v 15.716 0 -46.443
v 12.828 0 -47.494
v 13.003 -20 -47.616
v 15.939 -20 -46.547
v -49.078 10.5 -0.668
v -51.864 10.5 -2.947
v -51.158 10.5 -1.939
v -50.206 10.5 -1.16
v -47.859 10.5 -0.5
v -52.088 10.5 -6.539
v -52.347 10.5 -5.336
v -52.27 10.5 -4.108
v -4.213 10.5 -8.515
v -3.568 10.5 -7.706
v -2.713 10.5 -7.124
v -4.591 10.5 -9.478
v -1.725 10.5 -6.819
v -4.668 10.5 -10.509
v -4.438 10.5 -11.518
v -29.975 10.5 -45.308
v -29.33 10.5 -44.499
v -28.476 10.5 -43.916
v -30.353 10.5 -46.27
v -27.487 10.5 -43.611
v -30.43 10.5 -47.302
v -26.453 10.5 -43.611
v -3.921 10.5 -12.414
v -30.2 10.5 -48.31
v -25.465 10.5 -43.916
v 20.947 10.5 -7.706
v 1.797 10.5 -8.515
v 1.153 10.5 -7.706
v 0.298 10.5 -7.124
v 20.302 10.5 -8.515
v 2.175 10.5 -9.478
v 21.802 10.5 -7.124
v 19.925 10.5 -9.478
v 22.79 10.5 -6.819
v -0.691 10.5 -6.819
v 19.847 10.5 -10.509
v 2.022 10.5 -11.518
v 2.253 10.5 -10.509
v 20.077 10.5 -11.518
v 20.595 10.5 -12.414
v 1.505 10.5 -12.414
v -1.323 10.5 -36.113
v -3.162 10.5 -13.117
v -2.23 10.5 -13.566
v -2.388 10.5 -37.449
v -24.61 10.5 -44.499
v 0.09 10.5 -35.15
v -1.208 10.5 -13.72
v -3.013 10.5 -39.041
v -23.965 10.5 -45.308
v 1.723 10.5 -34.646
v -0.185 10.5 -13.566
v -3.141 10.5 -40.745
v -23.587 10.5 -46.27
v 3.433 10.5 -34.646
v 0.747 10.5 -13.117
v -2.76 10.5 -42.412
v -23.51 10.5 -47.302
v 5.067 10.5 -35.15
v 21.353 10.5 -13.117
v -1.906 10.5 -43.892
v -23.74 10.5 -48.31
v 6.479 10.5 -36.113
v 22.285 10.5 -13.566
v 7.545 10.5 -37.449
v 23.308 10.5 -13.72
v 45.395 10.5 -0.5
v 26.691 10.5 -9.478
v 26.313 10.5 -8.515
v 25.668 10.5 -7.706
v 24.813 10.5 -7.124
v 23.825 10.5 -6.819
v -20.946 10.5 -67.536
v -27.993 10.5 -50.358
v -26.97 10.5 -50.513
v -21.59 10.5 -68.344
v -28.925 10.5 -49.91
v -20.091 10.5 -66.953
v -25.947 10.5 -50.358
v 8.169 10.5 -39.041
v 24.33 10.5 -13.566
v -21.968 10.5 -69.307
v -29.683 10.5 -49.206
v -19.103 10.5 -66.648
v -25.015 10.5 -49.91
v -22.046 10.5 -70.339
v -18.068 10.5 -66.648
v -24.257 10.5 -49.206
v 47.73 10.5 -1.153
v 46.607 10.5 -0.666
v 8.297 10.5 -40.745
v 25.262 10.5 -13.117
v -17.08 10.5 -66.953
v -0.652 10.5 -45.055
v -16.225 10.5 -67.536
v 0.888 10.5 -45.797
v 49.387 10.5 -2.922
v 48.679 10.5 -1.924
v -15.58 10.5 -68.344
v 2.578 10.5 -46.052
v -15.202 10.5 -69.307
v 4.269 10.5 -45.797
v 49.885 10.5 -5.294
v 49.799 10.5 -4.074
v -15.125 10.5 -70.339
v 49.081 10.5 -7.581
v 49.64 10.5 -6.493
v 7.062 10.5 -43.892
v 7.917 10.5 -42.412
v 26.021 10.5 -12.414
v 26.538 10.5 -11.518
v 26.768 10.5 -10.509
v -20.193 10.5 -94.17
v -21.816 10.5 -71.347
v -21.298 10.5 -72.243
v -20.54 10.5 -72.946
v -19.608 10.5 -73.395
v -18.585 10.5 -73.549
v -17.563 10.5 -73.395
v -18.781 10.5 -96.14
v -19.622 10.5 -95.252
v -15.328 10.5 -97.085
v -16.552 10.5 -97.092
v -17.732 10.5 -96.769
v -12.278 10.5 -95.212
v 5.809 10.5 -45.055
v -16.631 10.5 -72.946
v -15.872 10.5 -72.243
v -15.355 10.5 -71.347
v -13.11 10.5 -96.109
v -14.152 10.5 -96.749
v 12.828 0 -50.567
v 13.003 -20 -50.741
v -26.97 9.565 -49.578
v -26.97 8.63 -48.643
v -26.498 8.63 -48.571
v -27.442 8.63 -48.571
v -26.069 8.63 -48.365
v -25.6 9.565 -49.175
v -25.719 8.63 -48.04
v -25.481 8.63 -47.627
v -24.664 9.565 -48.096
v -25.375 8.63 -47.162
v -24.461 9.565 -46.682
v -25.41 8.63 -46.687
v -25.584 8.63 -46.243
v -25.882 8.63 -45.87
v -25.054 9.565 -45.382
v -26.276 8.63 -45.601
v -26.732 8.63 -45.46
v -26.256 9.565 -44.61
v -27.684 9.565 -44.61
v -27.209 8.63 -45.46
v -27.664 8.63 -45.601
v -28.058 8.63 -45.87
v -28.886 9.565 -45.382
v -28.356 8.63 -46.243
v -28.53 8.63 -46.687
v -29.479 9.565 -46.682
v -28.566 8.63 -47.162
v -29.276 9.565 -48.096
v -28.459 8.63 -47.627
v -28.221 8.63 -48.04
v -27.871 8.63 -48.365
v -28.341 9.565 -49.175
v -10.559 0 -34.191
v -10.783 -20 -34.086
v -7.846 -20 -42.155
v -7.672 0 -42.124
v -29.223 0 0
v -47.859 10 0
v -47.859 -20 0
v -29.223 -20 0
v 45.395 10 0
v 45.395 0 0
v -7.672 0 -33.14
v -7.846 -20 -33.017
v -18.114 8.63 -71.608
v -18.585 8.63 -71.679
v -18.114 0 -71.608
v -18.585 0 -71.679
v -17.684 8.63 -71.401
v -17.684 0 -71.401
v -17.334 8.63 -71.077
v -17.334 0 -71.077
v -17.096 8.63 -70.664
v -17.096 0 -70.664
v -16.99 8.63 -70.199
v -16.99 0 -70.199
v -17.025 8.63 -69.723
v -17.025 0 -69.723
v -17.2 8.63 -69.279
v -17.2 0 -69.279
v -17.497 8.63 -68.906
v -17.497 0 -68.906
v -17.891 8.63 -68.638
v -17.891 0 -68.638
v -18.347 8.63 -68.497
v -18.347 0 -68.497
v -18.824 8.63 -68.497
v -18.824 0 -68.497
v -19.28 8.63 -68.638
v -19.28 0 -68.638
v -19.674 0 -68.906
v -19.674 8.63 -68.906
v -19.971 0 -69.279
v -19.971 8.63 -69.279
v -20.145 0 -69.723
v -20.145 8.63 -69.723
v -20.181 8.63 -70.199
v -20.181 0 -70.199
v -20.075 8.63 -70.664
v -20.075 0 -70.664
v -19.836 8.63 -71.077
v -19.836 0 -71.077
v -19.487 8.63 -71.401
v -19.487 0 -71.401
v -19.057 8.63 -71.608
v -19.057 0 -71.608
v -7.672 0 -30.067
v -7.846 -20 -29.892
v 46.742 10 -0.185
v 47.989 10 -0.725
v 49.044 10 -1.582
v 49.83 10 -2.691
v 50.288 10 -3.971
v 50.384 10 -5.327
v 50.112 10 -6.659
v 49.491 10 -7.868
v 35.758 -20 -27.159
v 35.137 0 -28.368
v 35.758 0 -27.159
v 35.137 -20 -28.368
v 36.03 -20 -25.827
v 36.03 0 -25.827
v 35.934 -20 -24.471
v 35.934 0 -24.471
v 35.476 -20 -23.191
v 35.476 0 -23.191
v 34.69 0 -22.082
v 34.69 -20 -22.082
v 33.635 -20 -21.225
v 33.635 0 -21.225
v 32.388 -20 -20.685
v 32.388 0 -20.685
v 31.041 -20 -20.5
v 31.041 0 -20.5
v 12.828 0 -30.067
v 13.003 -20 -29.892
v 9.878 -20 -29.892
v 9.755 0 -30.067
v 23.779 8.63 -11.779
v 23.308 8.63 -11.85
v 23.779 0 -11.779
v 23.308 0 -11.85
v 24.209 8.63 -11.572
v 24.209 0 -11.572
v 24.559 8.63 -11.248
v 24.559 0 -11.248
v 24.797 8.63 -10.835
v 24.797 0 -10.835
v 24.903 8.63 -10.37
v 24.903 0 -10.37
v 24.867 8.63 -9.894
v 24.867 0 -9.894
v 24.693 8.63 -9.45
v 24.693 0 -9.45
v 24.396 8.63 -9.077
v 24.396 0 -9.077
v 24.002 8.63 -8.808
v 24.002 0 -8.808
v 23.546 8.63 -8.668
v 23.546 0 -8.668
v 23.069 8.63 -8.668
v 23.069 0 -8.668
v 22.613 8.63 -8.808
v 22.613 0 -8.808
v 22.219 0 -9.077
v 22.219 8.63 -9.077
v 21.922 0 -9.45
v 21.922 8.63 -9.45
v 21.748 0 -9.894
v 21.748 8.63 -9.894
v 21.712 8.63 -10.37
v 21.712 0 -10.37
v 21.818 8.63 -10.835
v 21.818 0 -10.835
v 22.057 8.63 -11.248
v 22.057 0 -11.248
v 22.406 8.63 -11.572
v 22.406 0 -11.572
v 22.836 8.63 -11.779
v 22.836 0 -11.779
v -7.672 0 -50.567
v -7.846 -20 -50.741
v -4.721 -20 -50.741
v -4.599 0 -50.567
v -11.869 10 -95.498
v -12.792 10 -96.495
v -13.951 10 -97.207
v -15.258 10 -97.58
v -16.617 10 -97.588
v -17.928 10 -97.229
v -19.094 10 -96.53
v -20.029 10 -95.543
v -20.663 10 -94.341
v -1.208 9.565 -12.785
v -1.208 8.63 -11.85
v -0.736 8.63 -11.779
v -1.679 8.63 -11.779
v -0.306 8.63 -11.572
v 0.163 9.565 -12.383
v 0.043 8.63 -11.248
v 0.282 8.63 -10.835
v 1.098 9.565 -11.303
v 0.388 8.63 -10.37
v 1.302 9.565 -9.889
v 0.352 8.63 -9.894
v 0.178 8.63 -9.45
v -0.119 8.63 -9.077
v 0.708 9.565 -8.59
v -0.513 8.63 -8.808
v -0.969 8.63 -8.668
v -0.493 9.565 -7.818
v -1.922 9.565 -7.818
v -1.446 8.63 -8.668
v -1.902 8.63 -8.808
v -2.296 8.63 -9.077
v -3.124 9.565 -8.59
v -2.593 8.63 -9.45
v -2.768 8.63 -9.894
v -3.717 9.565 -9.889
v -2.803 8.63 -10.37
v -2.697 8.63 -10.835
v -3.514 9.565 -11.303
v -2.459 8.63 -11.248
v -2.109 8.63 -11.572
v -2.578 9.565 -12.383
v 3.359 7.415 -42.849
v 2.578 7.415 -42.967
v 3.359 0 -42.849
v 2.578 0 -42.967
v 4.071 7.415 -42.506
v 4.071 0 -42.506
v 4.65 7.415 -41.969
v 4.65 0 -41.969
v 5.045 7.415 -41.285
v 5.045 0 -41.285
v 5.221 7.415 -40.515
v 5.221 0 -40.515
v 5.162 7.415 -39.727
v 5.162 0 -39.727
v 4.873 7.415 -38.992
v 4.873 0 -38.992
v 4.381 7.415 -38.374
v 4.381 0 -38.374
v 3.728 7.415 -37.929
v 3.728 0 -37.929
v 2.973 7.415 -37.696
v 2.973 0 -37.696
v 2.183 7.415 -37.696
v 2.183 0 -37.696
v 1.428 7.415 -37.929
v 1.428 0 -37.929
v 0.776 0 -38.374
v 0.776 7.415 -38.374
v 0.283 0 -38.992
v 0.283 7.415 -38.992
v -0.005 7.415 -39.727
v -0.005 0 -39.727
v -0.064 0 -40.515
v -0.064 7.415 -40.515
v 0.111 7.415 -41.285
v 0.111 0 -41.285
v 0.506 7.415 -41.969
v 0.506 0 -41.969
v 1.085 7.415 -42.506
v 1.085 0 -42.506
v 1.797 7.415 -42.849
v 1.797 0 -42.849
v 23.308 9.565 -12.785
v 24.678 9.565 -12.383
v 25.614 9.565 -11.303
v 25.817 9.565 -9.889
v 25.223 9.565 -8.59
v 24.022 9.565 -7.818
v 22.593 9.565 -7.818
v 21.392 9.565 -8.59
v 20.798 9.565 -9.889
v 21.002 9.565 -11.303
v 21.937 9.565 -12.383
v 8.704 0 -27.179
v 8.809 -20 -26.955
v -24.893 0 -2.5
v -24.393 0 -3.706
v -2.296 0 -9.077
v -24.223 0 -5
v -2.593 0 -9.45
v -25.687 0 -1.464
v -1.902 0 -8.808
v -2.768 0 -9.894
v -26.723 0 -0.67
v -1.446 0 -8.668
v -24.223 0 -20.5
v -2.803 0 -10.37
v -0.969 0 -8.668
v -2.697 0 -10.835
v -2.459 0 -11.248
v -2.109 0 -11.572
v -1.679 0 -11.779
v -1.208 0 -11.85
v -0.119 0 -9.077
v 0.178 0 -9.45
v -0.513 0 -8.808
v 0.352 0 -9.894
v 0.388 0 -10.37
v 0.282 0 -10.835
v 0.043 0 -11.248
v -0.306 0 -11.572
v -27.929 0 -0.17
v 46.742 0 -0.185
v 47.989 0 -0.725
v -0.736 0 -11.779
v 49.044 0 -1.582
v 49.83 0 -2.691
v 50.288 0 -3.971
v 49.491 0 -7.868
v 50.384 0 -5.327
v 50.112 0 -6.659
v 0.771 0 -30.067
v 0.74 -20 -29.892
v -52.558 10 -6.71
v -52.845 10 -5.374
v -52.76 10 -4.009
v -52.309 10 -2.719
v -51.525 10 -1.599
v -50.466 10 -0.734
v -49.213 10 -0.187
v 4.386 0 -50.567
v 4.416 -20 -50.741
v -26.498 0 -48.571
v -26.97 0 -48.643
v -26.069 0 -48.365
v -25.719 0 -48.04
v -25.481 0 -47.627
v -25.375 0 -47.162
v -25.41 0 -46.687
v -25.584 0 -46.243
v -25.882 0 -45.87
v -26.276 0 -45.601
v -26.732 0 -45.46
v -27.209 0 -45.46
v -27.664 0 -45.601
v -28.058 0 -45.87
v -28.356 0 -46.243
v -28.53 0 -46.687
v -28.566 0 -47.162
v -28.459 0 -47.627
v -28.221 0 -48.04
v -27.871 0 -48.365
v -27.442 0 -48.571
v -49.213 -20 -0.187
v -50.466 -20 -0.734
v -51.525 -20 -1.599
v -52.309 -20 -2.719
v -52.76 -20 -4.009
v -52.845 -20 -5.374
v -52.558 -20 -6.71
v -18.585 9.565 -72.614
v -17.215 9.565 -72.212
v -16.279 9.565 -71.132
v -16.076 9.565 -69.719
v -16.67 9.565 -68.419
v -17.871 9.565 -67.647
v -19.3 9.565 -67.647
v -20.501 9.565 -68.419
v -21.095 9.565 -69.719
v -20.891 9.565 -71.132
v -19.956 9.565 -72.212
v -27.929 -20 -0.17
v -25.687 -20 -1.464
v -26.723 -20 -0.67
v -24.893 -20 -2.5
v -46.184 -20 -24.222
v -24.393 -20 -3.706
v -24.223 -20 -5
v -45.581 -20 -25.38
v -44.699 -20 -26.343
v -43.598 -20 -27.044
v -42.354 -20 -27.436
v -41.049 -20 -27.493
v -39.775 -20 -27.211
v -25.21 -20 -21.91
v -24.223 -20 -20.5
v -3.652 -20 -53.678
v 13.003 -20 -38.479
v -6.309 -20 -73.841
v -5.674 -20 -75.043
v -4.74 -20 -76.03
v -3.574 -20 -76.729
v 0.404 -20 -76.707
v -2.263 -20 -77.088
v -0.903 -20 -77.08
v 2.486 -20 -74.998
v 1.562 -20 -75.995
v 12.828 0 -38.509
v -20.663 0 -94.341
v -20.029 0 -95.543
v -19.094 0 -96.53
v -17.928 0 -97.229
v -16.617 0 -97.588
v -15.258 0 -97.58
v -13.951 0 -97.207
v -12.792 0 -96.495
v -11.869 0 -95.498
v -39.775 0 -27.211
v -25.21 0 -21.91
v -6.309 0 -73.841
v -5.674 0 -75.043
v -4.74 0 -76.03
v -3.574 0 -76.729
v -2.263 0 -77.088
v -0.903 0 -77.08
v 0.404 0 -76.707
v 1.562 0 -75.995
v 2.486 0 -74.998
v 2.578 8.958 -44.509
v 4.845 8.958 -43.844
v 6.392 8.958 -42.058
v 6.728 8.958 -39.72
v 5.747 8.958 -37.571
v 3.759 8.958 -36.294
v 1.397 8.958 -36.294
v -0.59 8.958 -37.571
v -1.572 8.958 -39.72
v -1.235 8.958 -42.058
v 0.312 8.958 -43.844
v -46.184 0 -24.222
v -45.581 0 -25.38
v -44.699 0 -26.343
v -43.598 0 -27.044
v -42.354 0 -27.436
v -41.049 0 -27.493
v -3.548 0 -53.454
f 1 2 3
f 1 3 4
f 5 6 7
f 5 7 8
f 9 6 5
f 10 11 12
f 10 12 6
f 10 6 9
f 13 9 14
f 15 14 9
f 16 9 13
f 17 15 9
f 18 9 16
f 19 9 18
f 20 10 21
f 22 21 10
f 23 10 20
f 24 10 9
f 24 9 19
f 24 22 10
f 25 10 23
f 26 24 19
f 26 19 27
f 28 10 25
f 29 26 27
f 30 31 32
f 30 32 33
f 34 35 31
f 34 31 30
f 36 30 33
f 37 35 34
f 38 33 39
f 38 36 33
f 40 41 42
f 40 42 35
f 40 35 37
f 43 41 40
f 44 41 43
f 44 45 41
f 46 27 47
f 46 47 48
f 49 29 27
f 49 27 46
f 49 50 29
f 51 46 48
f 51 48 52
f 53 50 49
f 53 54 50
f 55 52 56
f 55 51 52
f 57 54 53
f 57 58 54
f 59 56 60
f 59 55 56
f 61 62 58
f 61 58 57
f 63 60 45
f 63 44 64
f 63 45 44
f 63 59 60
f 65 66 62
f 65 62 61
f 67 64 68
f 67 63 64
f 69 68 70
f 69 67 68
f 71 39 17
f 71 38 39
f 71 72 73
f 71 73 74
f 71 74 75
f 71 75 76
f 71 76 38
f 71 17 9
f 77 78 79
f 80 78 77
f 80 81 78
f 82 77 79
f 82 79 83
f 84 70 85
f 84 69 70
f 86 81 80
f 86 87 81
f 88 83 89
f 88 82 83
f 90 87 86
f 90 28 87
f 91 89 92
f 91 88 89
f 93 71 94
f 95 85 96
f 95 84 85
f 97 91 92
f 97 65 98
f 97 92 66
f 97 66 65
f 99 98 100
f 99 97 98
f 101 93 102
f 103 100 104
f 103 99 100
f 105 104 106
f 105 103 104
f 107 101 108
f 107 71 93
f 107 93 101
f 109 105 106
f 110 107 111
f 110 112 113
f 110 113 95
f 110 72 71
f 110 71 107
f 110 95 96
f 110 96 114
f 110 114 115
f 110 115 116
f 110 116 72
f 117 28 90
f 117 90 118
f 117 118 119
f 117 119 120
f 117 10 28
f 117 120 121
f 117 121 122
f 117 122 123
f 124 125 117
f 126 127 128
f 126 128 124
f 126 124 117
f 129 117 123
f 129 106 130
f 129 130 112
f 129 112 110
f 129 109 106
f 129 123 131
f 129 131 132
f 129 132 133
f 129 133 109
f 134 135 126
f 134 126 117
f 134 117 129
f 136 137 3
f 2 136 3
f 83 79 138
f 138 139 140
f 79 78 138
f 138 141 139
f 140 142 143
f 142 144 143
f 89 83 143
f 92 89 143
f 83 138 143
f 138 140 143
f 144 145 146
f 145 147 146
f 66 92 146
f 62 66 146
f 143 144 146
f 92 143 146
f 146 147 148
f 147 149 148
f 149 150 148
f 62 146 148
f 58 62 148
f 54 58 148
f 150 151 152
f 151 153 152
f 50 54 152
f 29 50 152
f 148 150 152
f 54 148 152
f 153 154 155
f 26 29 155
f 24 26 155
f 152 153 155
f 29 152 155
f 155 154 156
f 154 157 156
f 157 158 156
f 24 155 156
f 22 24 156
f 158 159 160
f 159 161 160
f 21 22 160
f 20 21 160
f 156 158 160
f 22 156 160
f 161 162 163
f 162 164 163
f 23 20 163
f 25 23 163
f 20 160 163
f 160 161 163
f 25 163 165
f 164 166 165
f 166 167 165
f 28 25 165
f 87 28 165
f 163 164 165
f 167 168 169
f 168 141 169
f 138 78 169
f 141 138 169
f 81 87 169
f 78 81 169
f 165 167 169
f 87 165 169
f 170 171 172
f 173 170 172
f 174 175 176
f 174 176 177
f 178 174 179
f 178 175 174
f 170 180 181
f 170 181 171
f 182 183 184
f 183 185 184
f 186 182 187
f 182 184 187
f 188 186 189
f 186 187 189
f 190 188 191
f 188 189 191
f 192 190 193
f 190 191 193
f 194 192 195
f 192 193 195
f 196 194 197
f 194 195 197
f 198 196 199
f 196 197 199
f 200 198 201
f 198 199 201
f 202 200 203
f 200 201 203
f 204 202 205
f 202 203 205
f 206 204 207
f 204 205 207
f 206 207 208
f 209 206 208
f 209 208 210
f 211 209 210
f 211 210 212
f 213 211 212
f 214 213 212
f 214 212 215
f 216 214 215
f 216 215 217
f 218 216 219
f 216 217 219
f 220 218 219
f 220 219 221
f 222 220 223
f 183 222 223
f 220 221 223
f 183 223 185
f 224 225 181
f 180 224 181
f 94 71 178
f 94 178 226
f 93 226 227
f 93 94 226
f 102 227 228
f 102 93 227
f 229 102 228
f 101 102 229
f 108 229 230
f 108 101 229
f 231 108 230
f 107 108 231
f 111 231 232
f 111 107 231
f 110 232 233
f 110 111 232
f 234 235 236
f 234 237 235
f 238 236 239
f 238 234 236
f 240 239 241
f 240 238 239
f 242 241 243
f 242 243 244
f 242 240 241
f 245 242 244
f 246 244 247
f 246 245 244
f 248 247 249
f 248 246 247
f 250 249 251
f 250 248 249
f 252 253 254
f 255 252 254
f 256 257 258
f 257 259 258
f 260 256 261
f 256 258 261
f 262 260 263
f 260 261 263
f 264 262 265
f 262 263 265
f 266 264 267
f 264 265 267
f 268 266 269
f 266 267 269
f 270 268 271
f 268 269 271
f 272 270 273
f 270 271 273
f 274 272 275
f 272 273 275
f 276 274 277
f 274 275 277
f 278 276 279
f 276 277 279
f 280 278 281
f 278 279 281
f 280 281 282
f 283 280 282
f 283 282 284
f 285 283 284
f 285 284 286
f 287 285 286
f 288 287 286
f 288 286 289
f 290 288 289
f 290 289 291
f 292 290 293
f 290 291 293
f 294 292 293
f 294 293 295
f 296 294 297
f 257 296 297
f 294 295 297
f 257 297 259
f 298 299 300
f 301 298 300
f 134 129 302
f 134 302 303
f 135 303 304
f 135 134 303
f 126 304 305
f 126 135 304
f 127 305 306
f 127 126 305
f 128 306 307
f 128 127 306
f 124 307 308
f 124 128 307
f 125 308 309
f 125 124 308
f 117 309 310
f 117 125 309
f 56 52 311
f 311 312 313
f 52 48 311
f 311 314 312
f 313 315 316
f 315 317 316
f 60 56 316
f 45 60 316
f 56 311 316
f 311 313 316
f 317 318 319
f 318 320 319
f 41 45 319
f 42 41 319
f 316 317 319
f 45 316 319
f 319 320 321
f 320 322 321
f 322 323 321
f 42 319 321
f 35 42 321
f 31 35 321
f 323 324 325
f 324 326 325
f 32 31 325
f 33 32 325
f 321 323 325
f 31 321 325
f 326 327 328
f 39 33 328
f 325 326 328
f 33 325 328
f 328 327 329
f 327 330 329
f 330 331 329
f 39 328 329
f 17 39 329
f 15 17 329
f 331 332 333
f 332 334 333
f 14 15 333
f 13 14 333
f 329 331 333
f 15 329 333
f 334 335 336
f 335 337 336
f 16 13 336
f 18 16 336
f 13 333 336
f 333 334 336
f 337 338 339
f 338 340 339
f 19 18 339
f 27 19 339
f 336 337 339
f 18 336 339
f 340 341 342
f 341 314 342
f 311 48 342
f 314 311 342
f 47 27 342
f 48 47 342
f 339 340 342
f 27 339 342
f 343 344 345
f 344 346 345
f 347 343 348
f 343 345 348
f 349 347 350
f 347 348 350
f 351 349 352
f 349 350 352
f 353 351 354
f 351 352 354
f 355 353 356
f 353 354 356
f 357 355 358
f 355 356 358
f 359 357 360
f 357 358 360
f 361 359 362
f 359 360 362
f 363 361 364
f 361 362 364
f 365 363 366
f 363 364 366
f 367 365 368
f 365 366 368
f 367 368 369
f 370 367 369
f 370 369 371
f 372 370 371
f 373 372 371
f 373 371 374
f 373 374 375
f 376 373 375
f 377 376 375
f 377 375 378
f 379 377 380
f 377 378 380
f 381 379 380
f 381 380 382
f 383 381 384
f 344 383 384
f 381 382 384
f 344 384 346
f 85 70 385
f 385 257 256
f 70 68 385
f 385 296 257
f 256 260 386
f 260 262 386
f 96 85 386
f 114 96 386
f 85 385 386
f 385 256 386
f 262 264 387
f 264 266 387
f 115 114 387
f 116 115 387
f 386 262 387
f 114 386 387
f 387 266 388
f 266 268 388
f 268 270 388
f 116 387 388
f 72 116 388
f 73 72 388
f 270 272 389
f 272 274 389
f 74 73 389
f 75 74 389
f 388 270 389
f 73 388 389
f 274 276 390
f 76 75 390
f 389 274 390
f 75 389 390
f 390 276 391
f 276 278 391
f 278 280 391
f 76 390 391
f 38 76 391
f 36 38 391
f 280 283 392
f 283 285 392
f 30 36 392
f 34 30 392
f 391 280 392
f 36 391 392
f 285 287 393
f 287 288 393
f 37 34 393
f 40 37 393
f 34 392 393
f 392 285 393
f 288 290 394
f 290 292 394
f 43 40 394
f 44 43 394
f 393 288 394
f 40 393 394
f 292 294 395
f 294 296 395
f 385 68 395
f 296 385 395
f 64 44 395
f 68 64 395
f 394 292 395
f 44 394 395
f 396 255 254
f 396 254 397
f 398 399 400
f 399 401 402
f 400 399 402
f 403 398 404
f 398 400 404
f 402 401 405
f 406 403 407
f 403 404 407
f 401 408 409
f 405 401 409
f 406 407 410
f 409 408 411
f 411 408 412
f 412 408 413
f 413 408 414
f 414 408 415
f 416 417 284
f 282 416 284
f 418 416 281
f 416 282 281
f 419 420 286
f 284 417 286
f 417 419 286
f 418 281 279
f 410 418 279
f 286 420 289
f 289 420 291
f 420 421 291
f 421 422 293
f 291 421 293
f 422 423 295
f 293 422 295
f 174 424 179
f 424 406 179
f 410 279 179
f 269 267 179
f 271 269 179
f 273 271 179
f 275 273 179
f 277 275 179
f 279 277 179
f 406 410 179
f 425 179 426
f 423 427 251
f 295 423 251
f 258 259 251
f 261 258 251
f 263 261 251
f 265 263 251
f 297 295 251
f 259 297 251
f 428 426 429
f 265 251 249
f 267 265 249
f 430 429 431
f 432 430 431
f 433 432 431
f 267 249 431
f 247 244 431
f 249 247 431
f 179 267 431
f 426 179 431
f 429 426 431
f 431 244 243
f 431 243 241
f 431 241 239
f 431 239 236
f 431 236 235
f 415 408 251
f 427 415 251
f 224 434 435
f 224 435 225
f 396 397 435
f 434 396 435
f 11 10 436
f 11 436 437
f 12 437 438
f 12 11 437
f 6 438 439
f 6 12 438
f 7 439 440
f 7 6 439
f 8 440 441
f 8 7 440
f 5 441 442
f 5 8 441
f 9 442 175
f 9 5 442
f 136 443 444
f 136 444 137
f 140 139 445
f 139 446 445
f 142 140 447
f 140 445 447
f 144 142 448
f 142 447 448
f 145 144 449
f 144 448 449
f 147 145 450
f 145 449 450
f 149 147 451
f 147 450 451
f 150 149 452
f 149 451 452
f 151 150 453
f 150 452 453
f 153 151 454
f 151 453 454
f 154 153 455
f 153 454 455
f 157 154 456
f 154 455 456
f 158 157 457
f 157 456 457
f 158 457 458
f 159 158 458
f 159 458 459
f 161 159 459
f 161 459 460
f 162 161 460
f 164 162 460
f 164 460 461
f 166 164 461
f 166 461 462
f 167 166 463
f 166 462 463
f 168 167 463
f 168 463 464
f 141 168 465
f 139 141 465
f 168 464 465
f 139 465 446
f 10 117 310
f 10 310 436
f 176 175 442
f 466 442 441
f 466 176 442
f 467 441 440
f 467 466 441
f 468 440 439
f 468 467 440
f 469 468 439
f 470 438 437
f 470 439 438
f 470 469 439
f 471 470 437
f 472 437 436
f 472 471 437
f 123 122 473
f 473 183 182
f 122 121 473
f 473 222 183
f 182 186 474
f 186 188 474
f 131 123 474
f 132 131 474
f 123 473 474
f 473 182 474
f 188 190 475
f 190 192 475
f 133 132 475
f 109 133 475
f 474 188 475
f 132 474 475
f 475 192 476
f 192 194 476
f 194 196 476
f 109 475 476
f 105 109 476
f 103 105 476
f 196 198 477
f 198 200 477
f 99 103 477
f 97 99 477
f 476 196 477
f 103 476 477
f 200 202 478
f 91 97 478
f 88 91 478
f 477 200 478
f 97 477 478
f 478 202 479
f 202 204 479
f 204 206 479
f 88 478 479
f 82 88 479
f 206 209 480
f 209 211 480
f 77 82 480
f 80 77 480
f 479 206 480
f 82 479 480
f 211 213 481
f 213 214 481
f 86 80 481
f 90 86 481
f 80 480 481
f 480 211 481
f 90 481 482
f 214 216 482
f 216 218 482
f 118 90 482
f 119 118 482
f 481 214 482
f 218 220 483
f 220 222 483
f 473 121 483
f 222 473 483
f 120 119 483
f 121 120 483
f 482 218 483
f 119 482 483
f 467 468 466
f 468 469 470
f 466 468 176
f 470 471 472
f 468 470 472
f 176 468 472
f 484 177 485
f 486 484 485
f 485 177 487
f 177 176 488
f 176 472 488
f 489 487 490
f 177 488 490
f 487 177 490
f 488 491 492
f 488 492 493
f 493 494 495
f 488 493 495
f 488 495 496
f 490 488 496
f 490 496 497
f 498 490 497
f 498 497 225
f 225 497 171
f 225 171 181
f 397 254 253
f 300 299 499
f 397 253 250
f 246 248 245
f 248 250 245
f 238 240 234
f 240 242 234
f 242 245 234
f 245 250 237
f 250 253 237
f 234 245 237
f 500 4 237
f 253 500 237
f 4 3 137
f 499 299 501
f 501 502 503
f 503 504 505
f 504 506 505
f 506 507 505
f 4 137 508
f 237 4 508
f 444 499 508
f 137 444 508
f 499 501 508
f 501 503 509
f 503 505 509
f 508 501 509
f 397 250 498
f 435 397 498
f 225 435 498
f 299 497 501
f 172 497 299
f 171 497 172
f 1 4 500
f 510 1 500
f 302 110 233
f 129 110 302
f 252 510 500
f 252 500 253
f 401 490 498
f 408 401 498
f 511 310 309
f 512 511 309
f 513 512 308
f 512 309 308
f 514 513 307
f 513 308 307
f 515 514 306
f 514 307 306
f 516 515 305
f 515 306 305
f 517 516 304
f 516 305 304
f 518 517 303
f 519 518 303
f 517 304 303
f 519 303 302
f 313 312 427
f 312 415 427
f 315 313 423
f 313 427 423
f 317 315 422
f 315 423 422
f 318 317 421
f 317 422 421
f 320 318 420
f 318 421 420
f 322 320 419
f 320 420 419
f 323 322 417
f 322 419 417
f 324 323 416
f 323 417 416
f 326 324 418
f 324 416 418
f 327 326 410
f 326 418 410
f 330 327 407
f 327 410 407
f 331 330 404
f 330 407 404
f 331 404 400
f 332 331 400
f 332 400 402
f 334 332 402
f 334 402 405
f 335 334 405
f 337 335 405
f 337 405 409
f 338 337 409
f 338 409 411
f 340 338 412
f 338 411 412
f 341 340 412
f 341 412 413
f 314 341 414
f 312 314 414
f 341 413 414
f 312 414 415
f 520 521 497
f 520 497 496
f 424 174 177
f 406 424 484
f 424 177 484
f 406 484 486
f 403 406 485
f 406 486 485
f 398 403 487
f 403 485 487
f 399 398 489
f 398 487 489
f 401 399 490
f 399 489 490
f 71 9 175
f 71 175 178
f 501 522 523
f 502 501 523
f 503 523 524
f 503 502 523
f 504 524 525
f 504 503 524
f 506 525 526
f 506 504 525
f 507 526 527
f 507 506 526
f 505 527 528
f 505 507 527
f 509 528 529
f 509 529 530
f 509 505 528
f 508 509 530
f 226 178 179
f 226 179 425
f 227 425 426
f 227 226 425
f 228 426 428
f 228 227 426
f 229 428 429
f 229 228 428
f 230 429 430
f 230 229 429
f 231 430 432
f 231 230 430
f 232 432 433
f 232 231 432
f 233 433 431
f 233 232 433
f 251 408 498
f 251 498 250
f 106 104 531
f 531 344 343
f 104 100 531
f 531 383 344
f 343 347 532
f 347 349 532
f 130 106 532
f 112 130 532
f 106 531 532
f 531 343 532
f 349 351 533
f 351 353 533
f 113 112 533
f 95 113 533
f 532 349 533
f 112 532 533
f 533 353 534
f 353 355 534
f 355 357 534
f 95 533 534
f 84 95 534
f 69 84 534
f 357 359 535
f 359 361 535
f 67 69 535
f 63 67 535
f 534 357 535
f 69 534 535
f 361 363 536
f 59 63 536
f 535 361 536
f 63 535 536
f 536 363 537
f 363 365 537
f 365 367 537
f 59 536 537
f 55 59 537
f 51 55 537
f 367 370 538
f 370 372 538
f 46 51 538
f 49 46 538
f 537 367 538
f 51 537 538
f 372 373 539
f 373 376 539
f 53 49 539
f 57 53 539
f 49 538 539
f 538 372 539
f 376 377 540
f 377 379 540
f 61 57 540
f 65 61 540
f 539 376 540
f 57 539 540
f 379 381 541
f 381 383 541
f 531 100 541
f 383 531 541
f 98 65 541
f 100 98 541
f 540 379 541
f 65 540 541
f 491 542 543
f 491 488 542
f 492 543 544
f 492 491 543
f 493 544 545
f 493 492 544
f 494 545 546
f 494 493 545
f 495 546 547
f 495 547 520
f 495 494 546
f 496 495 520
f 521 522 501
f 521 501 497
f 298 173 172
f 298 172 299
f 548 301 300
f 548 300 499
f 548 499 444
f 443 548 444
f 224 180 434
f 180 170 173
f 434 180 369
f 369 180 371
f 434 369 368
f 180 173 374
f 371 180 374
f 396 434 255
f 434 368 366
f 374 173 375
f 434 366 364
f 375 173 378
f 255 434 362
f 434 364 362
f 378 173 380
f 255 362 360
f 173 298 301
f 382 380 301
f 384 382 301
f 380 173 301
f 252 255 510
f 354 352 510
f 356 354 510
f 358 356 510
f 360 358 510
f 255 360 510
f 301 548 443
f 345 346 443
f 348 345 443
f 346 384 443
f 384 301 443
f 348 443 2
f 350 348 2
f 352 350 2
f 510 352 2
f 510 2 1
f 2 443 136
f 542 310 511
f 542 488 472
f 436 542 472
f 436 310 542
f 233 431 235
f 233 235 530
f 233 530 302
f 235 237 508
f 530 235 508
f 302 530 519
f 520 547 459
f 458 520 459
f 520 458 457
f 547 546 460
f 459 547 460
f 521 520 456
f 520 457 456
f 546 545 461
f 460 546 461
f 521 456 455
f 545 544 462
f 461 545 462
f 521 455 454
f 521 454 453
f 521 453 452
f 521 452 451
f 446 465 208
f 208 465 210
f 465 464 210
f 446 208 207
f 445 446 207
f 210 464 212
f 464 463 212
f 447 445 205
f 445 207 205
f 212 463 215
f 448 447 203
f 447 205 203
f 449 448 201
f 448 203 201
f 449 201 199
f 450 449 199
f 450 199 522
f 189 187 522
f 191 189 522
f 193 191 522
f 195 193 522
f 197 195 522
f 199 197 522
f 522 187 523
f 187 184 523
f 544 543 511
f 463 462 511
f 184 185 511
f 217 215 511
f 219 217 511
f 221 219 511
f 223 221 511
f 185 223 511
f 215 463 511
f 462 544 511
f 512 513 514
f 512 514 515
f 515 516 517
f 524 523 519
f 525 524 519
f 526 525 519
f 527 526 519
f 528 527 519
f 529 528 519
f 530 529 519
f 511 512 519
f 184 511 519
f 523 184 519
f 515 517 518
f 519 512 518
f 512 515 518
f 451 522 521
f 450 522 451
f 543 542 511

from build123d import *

# Parameters (mm, degrees)
SKETCH1_R                                            = 1.0000000000000033
SKETCH1_R_2                                          = 0.9999999999999979
SKETCH1_R_3                                          = 1.000000000000005
SKETCH1_R_4                                          = 1.0000000000000018
SKETCH1_R_5                                          = 1.0000000000000029
MAIN_BODY_DEPTH                                      = 10.5
PROFILE_STOPS_DEPTH                                  = 20
CSK_FOR_M3_HEX_SOCKET_COUNTERSUNK_HEAD_S_D           = 3.2
CSK_FOR_M3_HEX_SOCKET_COUNTERSUNK_HEAD_S_DEPTH       = 30.5
CSK_FOR_M3_HEX_SOCKET_COUNTERSUNK_HEAD_S_CSINK_D     = 6.94
CSK_FOR_M3_HEX_SOCKET_COUNTERSUNK_HEAD_S_CSINK_ANGLE = 90
CSK_FOR_M5_HEX_SOCKET_COUNTERSUNK_HEAD_S_D           = 5.3
CSK_FOR_M5_HEX_SOCKET_COUNTERSUNK_HEAD_S_DEPTH       = 30.5
CSK_FOR_M5_HEX_SOCKET_COUNTERSUNK_HEAD_S_CSINK_D     = 11.47
CSK_FOR_M5_HEX_SOCKET_COUNTERSUNK_HEAD_S_CSINK_ANGLE = 90
FILLET1_R                                            = 5
FILLET3_R                                            = 5
DRAFT1_ANGLE                                         = 0.5000000000000011
CHAMFER2_SIZE                                        = 0.5


with BuildPart() as part:
    # Sketch1 → Main Body (new body)
    with BuildSketch(Plane(origin=(0, 0, 0), x_dir=(1, 0, 0), z_dir=(0, 1, 0))):
        Polygon((-55, 0), (55, -6.74e-15), (-17.37778423417673, 103.36618828645003), align=None)
        with Locations(Location((-1.2076863300743388, 10.249999999999998, 0), (0, 0, 90))):
            Circle(SKETCH1_R, mode=Mode.SUBTRACT)
        with Locations(Location((23.307593201638067, 10.25, 0), (0, 0, 90))):
            Circle(SKETCH1_R_2, mode=Mode.SUBTRACT)
        with Locations(Location((-26.970095805737262, 47.04253374154206, 0), (0, 0, 90))):
            Circle(SKETCH1_R_3, mode=Mode.SUBTRACT)
        with Locations(Location((-18.585376386632234, 70.07936101399606, 0), (0, 0, 90))):
            Circle(SKETCH1_R_4, mode=Mode.SUBTRACT)
        with Locations(Location((2.578216537695586, 40.31670125636554, 0), (0, 0, 90))):
            Circle(SKETCH1_R_5, mode=Mode.SUBTRACT)
    extrude(amount=MAIN_BODY_DEPTH)

    # Sketch1<3> → Profile Stops (add)
    with BuildSketch(Plane(origin=(0, 0, 0), x_dir=(1, 0, 0), z_dir=(0, 1, 0))):
        Polygon((-55, 0), (-24.222965861786736, 0), (-24.22296586178674, 20.499999999999996), (40.64574546670092, 20.500000000000004), (-3.023529700877628, 82.86618828645001), (-25.209935646798243, 21.909538931178865), (-44.47363437290938, 28.920951869355026), align=None)
        Polygon((-7.671783462304414, 33.139573989716), (-10.559339294448062, 34.19055836239805), (-7.671783462304414, 42.1240528086273), (-7.6717834623044165, 50.56670125636553), (-4.598910728953966, 50.56670125636553), (-3.547926356271911, 53.45425708850919), (4.385568089957344, 50.56670125636554), (12.828216537695583, 50.56670125636554), (12.828216537695583, 47.49382852301509), (15.715772369839232, 46.44284415033304), (12.828216537695585, 38.5093497041038), (12.828216537695587, 30.066701256365544), (9.755343804345129, 30.066701256365544), (8.70435943166308, 27.1791454242219), (0.7708649854338496, 30.06670125636554), (-7.671783462304413, 30.06670125636554), align=None, mode=Mode.SUBTRACT)
    extrude(amount=-PROFILE_STOPS_DEPTH)

    # CSK for M3 Hex Socket Countersunk Head Screw1
    with Locations(Plane(origin=(-18.585376387, 10.5, -70.079361014), x_dir=(0, 0, 1), z_dir=(0, 1, 0))):
        with Locations((0, 0), (23.036827272, -8.384719419), (59.829361014, 41.892969589), (59.829361014, 17.377690057)):
            CounterSinkHole(CSK_FOR_M3_HEX_SOCKET_COUNTERSUNK_HEAD_S_D / 2, CSK_FOR_M3_HEX_SOCKET_COUNTERSUNK_HEAD_S_CSINK_D / 2, depth=CSK_FOR_M3_HEX_SOCKET_COUNTERSUNK_HEAD_S_DEPTH, counter_sink_angle=CSK_FOR_M3_HEX_SOCKET_COUNTERSUNK_HEAD_S_CSINK_ANGLE)

    # CSK for M5 Hex Socket Countersunk Head Screw1
    with Locations(Plane(origin=(2.578216538, 10.5, -40.316701256), x_dir=(0, 0, 1), z_dir=(0, 1, 0))):
        with Locations((0, 0)):
            CounterSinkHole(CSK_FOR_M5_HEX_SOCKET_COUNTERSUNK_HEAD_S_D / 2, CSK_FOR_M5_HEX_SOCKET_COUNTERSUNK_HEAD_S_CSINK_D / 2, depth=CSK_FOR_M5_HEX_SOCKET_COUNTERSUNK_HEAD_S_DEPTH, counter_sink_angle=CSK_FOR_M5_HEX_SOCKET_COUNTERSUNK_HEAD_S_CSINK_ANGLE)

    # Fillet1
    fillet1_edges = [part.edges().sort_by_distance(p)[0] for p in [
        (-55, -4.75, 0),
        (-24.222965861786736, -10, 0),
        (-44.47363437290938, -10, -28.920951869355026),
    ]]
    fillet(fillet1_edges, radius=FILLET1_R)

    # Fillet3
    fillet3_edges = [part.edges().sort_by_distance(p)[0] for p in [
        (55, 5.25, 6.74e-15),
        (-17.37778423417673, 5.25, -103.36618828645003),
        (-3.0235297008776296, -10, -82.86618828645001),
        (40.645745466700916, -10, -20.5),
    ]]
    fillet(fillet3_edges, radius=FILLET3_R)

    # Draft1
    draft1_faces = [part.faces().sort_by_distance(p)[0] for p in [
        (11.291780171020358, -10, -30.066701256365544),
        (9.229851618004107, -10, -28.62292334029372),
        (4.737612208548465, -10, -28.622923340293717),
        (-3.4504592384352817, -10, -30.06670125636554),
        (-7.671783462304413, -10.000000000000002, -31.60313762304077),
        (-9.115561378376238, -10, -33.665066176057024),
        (-9.115561378376238, -10, -38.157305585512674),
        (-6.135347095629191, -10, -50.56670125636553),
        (-7.671783462304415, -10, -46.345377032496415),
        (-4.073418542612939, -10, -52.010479172437364),
        (0.4188208668427172, -10, -52.010479172437364),
        (8.606892313826464, -10, -50.56670125636554),
        (12.828216537695583, -10, -49.030264889690315),
        (14.271994453767409, -10, -46.968336336674064),
        (14.271994453767409, -10, -42.476096927218414),
        (12.828216537695587, -10, -34.28802548023467),
    ]]
    draft(draft1_faces, Plane(origin=(0, 0, 0), x_dir=(0, 0, -1), z_dir=(0, -1, 0)), DRAFT1_ANGLE)

    # Chamfer2
    chamfer2_edges = [part.edges().sort_by_distance(p)[0] for p in [
        (-1.232085300572649, 10.5, 3.29e-15),
        (-36.61029010817967, 10.5, -50.52531267809811),
        (-51.95502018773441, 10.5, -2.1321178182447573),
        (18.811107882911628, 10.5, -51.683094143225006),
        (-16.61702500331109, 10.5, -97.58764822980864),
        (49.83014353103527, 10.5, -2.6912569338248247),
    ]]
    chamfer(chamfer2_edges, length=CHAMFER2_SIZE)


solid = part.part
